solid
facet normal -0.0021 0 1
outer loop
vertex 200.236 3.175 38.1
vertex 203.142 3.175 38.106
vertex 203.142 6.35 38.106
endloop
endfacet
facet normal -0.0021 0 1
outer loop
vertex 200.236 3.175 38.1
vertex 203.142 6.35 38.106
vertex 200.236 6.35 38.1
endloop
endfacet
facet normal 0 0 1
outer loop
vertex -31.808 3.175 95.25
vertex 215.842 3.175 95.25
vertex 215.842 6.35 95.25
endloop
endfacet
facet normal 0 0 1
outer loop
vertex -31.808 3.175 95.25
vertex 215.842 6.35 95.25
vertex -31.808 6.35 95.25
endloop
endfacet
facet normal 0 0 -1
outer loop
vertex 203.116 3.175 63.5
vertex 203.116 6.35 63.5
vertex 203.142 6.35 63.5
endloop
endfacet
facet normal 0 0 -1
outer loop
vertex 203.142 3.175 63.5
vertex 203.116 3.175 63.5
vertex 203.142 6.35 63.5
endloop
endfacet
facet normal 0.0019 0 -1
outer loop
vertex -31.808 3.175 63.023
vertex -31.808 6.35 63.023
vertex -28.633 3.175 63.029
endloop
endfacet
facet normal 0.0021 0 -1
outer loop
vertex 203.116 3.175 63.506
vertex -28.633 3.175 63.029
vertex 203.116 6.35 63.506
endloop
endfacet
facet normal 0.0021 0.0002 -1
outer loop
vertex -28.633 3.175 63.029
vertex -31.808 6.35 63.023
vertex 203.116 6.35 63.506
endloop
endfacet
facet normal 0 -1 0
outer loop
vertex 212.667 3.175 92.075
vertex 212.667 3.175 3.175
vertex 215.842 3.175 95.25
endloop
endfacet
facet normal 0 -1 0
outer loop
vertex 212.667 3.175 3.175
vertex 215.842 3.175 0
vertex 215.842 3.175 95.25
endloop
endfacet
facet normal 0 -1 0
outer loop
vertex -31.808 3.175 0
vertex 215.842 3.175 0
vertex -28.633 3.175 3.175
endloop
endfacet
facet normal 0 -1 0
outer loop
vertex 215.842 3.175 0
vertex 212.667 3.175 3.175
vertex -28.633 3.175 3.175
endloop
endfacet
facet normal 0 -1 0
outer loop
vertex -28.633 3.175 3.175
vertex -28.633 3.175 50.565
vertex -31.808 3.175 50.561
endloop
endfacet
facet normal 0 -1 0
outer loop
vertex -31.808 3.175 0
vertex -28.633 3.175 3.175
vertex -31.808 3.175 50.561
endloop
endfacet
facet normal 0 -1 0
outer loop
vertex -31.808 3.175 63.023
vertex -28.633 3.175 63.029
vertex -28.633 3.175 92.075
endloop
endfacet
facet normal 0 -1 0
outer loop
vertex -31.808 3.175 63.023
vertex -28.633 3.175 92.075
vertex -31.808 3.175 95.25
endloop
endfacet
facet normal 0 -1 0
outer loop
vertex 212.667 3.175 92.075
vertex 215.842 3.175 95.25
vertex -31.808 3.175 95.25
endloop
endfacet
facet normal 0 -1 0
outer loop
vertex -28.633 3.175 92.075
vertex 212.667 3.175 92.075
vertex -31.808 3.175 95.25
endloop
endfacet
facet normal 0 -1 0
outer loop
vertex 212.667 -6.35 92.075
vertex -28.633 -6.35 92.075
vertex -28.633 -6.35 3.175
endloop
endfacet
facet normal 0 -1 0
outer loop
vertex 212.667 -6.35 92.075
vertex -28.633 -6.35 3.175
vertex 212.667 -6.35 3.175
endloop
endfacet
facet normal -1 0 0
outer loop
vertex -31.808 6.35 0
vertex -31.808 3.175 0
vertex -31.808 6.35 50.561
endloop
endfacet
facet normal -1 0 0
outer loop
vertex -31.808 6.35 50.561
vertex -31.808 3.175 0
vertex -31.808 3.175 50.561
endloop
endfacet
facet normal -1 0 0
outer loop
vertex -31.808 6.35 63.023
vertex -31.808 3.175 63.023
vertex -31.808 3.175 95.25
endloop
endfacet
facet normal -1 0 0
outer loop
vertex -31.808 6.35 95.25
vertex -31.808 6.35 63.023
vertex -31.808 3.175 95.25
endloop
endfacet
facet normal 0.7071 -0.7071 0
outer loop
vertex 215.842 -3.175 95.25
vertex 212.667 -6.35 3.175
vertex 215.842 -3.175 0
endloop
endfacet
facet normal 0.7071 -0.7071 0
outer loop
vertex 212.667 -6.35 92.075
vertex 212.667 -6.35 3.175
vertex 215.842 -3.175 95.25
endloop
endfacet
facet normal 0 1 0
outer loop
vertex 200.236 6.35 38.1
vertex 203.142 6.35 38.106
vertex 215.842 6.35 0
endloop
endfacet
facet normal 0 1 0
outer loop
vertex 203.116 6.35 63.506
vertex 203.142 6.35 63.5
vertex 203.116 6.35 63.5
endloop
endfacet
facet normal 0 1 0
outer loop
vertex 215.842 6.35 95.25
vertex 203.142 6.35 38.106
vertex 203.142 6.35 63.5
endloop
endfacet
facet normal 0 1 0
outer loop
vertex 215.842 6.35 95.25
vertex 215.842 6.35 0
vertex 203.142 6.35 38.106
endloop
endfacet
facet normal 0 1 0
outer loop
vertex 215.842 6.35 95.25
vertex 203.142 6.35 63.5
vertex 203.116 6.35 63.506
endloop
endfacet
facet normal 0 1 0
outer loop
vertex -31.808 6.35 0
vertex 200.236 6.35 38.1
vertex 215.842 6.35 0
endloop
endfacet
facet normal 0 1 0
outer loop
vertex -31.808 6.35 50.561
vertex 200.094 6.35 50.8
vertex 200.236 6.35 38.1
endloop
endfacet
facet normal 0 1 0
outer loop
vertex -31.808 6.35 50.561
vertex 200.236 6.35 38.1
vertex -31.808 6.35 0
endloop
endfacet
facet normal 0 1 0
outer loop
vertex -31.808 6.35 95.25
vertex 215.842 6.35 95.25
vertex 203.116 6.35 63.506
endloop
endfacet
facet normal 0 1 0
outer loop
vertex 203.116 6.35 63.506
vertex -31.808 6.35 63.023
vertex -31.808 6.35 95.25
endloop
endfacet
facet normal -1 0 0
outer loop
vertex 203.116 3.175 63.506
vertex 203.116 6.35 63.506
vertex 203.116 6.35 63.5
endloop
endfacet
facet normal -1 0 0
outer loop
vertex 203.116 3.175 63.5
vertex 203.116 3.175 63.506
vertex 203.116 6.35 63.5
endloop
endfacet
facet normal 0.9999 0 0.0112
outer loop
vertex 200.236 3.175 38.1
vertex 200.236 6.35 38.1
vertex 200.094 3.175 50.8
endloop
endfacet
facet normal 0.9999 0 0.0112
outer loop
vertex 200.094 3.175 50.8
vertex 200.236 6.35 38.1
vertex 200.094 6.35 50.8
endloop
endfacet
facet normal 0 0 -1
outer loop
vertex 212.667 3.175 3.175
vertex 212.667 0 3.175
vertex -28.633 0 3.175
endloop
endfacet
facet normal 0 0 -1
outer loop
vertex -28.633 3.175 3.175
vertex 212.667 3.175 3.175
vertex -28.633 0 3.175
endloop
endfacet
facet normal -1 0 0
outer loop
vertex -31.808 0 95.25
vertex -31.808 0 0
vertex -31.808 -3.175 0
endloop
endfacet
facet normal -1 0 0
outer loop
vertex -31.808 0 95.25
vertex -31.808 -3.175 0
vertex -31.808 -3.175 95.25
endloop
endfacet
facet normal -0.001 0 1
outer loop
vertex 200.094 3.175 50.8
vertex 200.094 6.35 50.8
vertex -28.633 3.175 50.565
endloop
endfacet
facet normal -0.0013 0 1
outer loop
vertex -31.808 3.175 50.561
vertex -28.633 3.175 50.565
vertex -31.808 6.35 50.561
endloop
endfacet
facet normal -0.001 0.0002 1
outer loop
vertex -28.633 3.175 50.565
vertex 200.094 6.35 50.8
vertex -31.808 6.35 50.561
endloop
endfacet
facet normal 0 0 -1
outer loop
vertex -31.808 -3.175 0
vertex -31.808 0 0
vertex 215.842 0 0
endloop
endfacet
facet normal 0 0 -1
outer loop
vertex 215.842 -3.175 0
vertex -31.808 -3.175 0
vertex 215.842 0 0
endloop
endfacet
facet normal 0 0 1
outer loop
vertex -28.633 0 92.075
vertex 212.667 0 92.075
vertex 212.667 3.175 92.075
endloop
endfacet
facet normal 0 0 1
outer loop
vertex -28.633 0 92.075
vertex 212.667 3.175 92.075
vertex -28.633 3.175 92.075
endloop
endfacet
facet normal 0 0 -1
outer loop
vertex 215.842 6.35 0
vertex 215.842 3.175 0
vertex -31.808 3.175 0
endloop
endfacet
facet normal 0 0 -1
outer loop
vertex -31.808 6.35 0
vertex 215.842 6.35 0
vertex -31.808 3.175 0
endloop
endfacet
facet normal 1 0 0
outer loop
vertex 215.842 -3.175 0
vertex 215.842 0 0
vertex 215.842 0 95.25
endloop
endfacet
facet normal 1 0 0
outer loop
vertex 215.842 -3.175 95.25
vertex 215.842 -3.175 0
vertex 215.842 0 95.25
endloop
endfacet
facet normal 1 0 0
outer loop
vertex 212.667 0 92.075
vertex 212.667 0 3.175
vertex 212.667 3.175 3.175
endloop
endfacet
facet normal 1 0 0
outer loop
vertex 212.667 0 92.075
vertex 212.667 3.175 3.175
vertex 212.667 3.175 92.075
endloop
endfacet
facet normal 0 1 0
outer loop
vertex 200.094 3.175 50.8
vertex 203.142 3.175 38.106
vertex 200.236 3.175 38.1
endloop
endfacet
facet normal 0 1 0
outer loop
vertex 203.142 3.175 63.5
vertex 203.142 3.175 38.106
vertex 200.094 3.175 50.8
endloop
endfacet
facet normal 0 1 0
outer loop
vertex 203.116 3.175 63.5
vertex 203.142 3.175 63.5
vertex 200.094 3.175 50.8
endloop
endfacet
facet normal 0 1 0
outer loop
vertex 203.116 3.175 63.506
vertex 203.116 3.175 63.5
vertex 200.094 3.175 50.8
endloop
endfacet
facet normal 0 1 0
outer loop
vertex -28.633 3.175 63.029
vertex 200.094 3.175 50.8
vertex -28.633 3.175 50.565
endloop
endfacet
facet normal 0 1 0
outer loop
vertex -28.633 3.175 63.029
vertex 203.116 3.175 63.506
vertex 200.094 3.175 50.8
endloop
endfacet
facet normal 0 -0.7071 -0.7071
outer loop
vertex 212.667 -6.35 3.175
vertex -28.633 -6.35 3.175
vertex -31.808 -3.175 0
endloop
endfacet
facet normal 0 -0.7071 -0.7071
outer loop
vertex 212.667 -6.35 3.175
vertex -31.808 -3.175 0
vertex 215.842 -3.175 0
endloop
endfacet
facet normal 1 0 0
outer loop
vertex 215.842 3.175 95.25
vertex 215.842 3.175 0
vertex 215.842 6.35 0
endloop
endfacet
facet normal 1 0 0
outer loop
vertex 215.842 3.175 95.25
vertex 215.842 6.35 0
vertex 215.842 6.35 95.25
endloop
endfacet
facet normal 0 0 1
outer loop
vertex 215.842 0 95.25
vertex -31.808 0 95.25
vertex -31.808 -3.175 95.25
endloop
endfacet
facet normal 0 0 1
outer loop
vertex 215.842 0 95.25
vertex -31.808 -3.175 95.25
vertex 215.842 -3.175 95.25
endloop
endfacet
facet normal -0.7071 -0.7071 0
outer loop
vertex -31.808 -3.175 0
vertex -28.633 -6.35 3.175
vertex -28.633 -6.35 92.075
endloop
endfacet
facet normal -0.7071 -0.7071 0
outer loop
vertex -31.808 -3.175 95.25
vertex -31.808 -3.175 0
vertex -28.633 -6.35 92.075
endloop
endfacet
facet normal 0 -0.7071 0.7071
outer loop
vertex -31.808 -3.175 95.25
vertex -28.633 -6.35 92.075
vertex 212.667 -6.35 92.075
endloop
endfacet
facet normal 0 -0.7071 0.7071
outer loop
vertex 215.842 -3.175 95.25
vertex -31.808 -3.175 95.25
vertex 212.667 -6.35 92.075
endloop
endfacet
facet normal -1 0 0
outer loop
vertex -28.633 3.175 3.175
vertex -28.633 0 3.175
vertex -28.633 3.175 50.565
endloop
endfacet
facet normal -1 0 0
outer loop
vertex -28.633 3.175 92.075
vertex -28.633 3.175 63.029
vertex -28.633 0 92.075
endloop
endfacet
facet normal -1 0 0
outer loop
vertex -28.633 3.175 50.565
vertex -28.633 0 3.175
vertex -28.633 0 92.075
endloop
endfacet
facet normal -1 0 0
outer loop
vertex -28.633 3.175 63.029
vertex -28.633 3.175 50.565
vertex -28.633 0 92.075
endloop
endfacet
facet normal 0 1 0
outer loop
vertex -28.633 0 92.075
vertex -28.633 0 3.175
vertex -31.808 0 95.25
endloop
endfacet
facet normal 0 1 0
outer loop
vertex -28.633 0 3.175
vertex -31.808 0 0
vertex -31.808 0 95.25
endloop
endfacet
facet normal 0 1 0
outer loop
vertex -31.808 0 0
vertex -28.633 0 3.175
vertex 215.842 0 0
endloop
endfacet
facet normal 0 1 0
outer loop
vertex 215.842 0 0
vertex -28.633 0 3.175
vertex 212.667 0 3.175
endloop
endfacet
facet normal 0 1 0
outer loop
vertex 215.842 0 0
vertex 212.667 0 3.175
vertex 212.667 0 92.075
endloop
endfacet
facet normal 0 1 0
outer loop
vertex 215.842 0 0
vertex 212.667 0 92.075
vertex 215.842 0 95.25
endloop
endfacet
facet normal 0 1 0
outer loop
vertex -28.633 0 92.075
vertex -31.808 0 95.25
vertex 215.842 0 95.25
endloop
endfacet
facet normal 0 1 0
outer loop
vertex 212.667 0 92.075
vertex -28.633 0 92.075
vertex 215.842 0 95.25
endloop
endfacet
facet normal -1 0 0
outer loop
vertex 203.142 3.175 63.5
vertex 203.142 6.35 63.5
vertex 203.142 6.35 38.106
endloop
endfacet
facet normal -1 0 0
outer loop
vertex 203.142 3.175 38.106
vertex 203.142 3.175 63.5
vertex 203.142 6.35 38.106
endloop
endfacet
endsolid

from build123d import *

# Parameters (mm, degrees)
F0_W     = 247.65
F0_H     = 95.25
F1_DEPTH = 6.35
F2_SIZE  = 3.175
F3_W     = 241.3
F3_H     = 88.9
F4_DEPTH = 3.175
F5_W     = 247.65
F5_H     = 95.25
F6_DEPTH = 3.175
F8_DEPTH = 3.175


with BuildPart() as f1:
    # F0 (on Front) → F1 (new body)
    with BuildSketch(Plane.XZ):
        with Locations((92.016742897, 47.625)):
            Rectangle(F0_W, F0_H)
    extrude(amount=F1_DEPTH)

    # F2
    f2_edges = [f1.edges().sort_by_distance(p)[0] for p in [
        (92.016743, -6.35, 95.25),
        (-31.808257, -6.35, 47.625),
        (92.016743, -6.35, 0),
        (215.841743, -6.35, 47.625),
    ]]
    chamfer(f2_edges, length=F2_SIZE)

    # F3 (on face) → F4 (join)
    with BuildSketch(Plane(origin=(0, 0, 0), x_dir=(-1, 0, 0), z_dir=(0, 1, 0))):
        with Locations((-92.016742897, 47.625)):
            Rectangle(F3_W, F3_H)
    extrude(amount=F4_DEPTH)

    # F5 (on face) → F6 (join)
    with BuildSketch(Plane(origin=(0, 3.175, 0), x_dir=(-1, 0, 0), z_dir=(0, 1, 0))):
        with Locations((-92.016742897, 47.625)):
            Rectangle(F5_W, F5_H)
    extrude(amount=F6_DEPTH)

    # F7 (on face) → F8 (cut)
    with BuildSketch(Plane(origin=(0, 6.35, 0), x_dir=(-1, 0, 0), z_dir=(0, 1, 0))):
        Polygon((-203.1155885079, 63.506246084), (-203.115601368, 63.5), (-203.141742897, 50.8031365043), (-203.141742897, 38.1062460972), (-200.2356058372, 38.1002626615), (-200.0943615794, 50.7999993861), (31.808257103, 50.5612678826), (31.808257103, 63.0225621771), align=None)
        Polygon((-203.141742897, 50.8031365043), (-203.115601368, 63.5), (-203.141742897, 63.5), align=None)
    extrude(amount=-F8_DEPTH, mode=Mode.SUBTRACT)


solid = f1.part
